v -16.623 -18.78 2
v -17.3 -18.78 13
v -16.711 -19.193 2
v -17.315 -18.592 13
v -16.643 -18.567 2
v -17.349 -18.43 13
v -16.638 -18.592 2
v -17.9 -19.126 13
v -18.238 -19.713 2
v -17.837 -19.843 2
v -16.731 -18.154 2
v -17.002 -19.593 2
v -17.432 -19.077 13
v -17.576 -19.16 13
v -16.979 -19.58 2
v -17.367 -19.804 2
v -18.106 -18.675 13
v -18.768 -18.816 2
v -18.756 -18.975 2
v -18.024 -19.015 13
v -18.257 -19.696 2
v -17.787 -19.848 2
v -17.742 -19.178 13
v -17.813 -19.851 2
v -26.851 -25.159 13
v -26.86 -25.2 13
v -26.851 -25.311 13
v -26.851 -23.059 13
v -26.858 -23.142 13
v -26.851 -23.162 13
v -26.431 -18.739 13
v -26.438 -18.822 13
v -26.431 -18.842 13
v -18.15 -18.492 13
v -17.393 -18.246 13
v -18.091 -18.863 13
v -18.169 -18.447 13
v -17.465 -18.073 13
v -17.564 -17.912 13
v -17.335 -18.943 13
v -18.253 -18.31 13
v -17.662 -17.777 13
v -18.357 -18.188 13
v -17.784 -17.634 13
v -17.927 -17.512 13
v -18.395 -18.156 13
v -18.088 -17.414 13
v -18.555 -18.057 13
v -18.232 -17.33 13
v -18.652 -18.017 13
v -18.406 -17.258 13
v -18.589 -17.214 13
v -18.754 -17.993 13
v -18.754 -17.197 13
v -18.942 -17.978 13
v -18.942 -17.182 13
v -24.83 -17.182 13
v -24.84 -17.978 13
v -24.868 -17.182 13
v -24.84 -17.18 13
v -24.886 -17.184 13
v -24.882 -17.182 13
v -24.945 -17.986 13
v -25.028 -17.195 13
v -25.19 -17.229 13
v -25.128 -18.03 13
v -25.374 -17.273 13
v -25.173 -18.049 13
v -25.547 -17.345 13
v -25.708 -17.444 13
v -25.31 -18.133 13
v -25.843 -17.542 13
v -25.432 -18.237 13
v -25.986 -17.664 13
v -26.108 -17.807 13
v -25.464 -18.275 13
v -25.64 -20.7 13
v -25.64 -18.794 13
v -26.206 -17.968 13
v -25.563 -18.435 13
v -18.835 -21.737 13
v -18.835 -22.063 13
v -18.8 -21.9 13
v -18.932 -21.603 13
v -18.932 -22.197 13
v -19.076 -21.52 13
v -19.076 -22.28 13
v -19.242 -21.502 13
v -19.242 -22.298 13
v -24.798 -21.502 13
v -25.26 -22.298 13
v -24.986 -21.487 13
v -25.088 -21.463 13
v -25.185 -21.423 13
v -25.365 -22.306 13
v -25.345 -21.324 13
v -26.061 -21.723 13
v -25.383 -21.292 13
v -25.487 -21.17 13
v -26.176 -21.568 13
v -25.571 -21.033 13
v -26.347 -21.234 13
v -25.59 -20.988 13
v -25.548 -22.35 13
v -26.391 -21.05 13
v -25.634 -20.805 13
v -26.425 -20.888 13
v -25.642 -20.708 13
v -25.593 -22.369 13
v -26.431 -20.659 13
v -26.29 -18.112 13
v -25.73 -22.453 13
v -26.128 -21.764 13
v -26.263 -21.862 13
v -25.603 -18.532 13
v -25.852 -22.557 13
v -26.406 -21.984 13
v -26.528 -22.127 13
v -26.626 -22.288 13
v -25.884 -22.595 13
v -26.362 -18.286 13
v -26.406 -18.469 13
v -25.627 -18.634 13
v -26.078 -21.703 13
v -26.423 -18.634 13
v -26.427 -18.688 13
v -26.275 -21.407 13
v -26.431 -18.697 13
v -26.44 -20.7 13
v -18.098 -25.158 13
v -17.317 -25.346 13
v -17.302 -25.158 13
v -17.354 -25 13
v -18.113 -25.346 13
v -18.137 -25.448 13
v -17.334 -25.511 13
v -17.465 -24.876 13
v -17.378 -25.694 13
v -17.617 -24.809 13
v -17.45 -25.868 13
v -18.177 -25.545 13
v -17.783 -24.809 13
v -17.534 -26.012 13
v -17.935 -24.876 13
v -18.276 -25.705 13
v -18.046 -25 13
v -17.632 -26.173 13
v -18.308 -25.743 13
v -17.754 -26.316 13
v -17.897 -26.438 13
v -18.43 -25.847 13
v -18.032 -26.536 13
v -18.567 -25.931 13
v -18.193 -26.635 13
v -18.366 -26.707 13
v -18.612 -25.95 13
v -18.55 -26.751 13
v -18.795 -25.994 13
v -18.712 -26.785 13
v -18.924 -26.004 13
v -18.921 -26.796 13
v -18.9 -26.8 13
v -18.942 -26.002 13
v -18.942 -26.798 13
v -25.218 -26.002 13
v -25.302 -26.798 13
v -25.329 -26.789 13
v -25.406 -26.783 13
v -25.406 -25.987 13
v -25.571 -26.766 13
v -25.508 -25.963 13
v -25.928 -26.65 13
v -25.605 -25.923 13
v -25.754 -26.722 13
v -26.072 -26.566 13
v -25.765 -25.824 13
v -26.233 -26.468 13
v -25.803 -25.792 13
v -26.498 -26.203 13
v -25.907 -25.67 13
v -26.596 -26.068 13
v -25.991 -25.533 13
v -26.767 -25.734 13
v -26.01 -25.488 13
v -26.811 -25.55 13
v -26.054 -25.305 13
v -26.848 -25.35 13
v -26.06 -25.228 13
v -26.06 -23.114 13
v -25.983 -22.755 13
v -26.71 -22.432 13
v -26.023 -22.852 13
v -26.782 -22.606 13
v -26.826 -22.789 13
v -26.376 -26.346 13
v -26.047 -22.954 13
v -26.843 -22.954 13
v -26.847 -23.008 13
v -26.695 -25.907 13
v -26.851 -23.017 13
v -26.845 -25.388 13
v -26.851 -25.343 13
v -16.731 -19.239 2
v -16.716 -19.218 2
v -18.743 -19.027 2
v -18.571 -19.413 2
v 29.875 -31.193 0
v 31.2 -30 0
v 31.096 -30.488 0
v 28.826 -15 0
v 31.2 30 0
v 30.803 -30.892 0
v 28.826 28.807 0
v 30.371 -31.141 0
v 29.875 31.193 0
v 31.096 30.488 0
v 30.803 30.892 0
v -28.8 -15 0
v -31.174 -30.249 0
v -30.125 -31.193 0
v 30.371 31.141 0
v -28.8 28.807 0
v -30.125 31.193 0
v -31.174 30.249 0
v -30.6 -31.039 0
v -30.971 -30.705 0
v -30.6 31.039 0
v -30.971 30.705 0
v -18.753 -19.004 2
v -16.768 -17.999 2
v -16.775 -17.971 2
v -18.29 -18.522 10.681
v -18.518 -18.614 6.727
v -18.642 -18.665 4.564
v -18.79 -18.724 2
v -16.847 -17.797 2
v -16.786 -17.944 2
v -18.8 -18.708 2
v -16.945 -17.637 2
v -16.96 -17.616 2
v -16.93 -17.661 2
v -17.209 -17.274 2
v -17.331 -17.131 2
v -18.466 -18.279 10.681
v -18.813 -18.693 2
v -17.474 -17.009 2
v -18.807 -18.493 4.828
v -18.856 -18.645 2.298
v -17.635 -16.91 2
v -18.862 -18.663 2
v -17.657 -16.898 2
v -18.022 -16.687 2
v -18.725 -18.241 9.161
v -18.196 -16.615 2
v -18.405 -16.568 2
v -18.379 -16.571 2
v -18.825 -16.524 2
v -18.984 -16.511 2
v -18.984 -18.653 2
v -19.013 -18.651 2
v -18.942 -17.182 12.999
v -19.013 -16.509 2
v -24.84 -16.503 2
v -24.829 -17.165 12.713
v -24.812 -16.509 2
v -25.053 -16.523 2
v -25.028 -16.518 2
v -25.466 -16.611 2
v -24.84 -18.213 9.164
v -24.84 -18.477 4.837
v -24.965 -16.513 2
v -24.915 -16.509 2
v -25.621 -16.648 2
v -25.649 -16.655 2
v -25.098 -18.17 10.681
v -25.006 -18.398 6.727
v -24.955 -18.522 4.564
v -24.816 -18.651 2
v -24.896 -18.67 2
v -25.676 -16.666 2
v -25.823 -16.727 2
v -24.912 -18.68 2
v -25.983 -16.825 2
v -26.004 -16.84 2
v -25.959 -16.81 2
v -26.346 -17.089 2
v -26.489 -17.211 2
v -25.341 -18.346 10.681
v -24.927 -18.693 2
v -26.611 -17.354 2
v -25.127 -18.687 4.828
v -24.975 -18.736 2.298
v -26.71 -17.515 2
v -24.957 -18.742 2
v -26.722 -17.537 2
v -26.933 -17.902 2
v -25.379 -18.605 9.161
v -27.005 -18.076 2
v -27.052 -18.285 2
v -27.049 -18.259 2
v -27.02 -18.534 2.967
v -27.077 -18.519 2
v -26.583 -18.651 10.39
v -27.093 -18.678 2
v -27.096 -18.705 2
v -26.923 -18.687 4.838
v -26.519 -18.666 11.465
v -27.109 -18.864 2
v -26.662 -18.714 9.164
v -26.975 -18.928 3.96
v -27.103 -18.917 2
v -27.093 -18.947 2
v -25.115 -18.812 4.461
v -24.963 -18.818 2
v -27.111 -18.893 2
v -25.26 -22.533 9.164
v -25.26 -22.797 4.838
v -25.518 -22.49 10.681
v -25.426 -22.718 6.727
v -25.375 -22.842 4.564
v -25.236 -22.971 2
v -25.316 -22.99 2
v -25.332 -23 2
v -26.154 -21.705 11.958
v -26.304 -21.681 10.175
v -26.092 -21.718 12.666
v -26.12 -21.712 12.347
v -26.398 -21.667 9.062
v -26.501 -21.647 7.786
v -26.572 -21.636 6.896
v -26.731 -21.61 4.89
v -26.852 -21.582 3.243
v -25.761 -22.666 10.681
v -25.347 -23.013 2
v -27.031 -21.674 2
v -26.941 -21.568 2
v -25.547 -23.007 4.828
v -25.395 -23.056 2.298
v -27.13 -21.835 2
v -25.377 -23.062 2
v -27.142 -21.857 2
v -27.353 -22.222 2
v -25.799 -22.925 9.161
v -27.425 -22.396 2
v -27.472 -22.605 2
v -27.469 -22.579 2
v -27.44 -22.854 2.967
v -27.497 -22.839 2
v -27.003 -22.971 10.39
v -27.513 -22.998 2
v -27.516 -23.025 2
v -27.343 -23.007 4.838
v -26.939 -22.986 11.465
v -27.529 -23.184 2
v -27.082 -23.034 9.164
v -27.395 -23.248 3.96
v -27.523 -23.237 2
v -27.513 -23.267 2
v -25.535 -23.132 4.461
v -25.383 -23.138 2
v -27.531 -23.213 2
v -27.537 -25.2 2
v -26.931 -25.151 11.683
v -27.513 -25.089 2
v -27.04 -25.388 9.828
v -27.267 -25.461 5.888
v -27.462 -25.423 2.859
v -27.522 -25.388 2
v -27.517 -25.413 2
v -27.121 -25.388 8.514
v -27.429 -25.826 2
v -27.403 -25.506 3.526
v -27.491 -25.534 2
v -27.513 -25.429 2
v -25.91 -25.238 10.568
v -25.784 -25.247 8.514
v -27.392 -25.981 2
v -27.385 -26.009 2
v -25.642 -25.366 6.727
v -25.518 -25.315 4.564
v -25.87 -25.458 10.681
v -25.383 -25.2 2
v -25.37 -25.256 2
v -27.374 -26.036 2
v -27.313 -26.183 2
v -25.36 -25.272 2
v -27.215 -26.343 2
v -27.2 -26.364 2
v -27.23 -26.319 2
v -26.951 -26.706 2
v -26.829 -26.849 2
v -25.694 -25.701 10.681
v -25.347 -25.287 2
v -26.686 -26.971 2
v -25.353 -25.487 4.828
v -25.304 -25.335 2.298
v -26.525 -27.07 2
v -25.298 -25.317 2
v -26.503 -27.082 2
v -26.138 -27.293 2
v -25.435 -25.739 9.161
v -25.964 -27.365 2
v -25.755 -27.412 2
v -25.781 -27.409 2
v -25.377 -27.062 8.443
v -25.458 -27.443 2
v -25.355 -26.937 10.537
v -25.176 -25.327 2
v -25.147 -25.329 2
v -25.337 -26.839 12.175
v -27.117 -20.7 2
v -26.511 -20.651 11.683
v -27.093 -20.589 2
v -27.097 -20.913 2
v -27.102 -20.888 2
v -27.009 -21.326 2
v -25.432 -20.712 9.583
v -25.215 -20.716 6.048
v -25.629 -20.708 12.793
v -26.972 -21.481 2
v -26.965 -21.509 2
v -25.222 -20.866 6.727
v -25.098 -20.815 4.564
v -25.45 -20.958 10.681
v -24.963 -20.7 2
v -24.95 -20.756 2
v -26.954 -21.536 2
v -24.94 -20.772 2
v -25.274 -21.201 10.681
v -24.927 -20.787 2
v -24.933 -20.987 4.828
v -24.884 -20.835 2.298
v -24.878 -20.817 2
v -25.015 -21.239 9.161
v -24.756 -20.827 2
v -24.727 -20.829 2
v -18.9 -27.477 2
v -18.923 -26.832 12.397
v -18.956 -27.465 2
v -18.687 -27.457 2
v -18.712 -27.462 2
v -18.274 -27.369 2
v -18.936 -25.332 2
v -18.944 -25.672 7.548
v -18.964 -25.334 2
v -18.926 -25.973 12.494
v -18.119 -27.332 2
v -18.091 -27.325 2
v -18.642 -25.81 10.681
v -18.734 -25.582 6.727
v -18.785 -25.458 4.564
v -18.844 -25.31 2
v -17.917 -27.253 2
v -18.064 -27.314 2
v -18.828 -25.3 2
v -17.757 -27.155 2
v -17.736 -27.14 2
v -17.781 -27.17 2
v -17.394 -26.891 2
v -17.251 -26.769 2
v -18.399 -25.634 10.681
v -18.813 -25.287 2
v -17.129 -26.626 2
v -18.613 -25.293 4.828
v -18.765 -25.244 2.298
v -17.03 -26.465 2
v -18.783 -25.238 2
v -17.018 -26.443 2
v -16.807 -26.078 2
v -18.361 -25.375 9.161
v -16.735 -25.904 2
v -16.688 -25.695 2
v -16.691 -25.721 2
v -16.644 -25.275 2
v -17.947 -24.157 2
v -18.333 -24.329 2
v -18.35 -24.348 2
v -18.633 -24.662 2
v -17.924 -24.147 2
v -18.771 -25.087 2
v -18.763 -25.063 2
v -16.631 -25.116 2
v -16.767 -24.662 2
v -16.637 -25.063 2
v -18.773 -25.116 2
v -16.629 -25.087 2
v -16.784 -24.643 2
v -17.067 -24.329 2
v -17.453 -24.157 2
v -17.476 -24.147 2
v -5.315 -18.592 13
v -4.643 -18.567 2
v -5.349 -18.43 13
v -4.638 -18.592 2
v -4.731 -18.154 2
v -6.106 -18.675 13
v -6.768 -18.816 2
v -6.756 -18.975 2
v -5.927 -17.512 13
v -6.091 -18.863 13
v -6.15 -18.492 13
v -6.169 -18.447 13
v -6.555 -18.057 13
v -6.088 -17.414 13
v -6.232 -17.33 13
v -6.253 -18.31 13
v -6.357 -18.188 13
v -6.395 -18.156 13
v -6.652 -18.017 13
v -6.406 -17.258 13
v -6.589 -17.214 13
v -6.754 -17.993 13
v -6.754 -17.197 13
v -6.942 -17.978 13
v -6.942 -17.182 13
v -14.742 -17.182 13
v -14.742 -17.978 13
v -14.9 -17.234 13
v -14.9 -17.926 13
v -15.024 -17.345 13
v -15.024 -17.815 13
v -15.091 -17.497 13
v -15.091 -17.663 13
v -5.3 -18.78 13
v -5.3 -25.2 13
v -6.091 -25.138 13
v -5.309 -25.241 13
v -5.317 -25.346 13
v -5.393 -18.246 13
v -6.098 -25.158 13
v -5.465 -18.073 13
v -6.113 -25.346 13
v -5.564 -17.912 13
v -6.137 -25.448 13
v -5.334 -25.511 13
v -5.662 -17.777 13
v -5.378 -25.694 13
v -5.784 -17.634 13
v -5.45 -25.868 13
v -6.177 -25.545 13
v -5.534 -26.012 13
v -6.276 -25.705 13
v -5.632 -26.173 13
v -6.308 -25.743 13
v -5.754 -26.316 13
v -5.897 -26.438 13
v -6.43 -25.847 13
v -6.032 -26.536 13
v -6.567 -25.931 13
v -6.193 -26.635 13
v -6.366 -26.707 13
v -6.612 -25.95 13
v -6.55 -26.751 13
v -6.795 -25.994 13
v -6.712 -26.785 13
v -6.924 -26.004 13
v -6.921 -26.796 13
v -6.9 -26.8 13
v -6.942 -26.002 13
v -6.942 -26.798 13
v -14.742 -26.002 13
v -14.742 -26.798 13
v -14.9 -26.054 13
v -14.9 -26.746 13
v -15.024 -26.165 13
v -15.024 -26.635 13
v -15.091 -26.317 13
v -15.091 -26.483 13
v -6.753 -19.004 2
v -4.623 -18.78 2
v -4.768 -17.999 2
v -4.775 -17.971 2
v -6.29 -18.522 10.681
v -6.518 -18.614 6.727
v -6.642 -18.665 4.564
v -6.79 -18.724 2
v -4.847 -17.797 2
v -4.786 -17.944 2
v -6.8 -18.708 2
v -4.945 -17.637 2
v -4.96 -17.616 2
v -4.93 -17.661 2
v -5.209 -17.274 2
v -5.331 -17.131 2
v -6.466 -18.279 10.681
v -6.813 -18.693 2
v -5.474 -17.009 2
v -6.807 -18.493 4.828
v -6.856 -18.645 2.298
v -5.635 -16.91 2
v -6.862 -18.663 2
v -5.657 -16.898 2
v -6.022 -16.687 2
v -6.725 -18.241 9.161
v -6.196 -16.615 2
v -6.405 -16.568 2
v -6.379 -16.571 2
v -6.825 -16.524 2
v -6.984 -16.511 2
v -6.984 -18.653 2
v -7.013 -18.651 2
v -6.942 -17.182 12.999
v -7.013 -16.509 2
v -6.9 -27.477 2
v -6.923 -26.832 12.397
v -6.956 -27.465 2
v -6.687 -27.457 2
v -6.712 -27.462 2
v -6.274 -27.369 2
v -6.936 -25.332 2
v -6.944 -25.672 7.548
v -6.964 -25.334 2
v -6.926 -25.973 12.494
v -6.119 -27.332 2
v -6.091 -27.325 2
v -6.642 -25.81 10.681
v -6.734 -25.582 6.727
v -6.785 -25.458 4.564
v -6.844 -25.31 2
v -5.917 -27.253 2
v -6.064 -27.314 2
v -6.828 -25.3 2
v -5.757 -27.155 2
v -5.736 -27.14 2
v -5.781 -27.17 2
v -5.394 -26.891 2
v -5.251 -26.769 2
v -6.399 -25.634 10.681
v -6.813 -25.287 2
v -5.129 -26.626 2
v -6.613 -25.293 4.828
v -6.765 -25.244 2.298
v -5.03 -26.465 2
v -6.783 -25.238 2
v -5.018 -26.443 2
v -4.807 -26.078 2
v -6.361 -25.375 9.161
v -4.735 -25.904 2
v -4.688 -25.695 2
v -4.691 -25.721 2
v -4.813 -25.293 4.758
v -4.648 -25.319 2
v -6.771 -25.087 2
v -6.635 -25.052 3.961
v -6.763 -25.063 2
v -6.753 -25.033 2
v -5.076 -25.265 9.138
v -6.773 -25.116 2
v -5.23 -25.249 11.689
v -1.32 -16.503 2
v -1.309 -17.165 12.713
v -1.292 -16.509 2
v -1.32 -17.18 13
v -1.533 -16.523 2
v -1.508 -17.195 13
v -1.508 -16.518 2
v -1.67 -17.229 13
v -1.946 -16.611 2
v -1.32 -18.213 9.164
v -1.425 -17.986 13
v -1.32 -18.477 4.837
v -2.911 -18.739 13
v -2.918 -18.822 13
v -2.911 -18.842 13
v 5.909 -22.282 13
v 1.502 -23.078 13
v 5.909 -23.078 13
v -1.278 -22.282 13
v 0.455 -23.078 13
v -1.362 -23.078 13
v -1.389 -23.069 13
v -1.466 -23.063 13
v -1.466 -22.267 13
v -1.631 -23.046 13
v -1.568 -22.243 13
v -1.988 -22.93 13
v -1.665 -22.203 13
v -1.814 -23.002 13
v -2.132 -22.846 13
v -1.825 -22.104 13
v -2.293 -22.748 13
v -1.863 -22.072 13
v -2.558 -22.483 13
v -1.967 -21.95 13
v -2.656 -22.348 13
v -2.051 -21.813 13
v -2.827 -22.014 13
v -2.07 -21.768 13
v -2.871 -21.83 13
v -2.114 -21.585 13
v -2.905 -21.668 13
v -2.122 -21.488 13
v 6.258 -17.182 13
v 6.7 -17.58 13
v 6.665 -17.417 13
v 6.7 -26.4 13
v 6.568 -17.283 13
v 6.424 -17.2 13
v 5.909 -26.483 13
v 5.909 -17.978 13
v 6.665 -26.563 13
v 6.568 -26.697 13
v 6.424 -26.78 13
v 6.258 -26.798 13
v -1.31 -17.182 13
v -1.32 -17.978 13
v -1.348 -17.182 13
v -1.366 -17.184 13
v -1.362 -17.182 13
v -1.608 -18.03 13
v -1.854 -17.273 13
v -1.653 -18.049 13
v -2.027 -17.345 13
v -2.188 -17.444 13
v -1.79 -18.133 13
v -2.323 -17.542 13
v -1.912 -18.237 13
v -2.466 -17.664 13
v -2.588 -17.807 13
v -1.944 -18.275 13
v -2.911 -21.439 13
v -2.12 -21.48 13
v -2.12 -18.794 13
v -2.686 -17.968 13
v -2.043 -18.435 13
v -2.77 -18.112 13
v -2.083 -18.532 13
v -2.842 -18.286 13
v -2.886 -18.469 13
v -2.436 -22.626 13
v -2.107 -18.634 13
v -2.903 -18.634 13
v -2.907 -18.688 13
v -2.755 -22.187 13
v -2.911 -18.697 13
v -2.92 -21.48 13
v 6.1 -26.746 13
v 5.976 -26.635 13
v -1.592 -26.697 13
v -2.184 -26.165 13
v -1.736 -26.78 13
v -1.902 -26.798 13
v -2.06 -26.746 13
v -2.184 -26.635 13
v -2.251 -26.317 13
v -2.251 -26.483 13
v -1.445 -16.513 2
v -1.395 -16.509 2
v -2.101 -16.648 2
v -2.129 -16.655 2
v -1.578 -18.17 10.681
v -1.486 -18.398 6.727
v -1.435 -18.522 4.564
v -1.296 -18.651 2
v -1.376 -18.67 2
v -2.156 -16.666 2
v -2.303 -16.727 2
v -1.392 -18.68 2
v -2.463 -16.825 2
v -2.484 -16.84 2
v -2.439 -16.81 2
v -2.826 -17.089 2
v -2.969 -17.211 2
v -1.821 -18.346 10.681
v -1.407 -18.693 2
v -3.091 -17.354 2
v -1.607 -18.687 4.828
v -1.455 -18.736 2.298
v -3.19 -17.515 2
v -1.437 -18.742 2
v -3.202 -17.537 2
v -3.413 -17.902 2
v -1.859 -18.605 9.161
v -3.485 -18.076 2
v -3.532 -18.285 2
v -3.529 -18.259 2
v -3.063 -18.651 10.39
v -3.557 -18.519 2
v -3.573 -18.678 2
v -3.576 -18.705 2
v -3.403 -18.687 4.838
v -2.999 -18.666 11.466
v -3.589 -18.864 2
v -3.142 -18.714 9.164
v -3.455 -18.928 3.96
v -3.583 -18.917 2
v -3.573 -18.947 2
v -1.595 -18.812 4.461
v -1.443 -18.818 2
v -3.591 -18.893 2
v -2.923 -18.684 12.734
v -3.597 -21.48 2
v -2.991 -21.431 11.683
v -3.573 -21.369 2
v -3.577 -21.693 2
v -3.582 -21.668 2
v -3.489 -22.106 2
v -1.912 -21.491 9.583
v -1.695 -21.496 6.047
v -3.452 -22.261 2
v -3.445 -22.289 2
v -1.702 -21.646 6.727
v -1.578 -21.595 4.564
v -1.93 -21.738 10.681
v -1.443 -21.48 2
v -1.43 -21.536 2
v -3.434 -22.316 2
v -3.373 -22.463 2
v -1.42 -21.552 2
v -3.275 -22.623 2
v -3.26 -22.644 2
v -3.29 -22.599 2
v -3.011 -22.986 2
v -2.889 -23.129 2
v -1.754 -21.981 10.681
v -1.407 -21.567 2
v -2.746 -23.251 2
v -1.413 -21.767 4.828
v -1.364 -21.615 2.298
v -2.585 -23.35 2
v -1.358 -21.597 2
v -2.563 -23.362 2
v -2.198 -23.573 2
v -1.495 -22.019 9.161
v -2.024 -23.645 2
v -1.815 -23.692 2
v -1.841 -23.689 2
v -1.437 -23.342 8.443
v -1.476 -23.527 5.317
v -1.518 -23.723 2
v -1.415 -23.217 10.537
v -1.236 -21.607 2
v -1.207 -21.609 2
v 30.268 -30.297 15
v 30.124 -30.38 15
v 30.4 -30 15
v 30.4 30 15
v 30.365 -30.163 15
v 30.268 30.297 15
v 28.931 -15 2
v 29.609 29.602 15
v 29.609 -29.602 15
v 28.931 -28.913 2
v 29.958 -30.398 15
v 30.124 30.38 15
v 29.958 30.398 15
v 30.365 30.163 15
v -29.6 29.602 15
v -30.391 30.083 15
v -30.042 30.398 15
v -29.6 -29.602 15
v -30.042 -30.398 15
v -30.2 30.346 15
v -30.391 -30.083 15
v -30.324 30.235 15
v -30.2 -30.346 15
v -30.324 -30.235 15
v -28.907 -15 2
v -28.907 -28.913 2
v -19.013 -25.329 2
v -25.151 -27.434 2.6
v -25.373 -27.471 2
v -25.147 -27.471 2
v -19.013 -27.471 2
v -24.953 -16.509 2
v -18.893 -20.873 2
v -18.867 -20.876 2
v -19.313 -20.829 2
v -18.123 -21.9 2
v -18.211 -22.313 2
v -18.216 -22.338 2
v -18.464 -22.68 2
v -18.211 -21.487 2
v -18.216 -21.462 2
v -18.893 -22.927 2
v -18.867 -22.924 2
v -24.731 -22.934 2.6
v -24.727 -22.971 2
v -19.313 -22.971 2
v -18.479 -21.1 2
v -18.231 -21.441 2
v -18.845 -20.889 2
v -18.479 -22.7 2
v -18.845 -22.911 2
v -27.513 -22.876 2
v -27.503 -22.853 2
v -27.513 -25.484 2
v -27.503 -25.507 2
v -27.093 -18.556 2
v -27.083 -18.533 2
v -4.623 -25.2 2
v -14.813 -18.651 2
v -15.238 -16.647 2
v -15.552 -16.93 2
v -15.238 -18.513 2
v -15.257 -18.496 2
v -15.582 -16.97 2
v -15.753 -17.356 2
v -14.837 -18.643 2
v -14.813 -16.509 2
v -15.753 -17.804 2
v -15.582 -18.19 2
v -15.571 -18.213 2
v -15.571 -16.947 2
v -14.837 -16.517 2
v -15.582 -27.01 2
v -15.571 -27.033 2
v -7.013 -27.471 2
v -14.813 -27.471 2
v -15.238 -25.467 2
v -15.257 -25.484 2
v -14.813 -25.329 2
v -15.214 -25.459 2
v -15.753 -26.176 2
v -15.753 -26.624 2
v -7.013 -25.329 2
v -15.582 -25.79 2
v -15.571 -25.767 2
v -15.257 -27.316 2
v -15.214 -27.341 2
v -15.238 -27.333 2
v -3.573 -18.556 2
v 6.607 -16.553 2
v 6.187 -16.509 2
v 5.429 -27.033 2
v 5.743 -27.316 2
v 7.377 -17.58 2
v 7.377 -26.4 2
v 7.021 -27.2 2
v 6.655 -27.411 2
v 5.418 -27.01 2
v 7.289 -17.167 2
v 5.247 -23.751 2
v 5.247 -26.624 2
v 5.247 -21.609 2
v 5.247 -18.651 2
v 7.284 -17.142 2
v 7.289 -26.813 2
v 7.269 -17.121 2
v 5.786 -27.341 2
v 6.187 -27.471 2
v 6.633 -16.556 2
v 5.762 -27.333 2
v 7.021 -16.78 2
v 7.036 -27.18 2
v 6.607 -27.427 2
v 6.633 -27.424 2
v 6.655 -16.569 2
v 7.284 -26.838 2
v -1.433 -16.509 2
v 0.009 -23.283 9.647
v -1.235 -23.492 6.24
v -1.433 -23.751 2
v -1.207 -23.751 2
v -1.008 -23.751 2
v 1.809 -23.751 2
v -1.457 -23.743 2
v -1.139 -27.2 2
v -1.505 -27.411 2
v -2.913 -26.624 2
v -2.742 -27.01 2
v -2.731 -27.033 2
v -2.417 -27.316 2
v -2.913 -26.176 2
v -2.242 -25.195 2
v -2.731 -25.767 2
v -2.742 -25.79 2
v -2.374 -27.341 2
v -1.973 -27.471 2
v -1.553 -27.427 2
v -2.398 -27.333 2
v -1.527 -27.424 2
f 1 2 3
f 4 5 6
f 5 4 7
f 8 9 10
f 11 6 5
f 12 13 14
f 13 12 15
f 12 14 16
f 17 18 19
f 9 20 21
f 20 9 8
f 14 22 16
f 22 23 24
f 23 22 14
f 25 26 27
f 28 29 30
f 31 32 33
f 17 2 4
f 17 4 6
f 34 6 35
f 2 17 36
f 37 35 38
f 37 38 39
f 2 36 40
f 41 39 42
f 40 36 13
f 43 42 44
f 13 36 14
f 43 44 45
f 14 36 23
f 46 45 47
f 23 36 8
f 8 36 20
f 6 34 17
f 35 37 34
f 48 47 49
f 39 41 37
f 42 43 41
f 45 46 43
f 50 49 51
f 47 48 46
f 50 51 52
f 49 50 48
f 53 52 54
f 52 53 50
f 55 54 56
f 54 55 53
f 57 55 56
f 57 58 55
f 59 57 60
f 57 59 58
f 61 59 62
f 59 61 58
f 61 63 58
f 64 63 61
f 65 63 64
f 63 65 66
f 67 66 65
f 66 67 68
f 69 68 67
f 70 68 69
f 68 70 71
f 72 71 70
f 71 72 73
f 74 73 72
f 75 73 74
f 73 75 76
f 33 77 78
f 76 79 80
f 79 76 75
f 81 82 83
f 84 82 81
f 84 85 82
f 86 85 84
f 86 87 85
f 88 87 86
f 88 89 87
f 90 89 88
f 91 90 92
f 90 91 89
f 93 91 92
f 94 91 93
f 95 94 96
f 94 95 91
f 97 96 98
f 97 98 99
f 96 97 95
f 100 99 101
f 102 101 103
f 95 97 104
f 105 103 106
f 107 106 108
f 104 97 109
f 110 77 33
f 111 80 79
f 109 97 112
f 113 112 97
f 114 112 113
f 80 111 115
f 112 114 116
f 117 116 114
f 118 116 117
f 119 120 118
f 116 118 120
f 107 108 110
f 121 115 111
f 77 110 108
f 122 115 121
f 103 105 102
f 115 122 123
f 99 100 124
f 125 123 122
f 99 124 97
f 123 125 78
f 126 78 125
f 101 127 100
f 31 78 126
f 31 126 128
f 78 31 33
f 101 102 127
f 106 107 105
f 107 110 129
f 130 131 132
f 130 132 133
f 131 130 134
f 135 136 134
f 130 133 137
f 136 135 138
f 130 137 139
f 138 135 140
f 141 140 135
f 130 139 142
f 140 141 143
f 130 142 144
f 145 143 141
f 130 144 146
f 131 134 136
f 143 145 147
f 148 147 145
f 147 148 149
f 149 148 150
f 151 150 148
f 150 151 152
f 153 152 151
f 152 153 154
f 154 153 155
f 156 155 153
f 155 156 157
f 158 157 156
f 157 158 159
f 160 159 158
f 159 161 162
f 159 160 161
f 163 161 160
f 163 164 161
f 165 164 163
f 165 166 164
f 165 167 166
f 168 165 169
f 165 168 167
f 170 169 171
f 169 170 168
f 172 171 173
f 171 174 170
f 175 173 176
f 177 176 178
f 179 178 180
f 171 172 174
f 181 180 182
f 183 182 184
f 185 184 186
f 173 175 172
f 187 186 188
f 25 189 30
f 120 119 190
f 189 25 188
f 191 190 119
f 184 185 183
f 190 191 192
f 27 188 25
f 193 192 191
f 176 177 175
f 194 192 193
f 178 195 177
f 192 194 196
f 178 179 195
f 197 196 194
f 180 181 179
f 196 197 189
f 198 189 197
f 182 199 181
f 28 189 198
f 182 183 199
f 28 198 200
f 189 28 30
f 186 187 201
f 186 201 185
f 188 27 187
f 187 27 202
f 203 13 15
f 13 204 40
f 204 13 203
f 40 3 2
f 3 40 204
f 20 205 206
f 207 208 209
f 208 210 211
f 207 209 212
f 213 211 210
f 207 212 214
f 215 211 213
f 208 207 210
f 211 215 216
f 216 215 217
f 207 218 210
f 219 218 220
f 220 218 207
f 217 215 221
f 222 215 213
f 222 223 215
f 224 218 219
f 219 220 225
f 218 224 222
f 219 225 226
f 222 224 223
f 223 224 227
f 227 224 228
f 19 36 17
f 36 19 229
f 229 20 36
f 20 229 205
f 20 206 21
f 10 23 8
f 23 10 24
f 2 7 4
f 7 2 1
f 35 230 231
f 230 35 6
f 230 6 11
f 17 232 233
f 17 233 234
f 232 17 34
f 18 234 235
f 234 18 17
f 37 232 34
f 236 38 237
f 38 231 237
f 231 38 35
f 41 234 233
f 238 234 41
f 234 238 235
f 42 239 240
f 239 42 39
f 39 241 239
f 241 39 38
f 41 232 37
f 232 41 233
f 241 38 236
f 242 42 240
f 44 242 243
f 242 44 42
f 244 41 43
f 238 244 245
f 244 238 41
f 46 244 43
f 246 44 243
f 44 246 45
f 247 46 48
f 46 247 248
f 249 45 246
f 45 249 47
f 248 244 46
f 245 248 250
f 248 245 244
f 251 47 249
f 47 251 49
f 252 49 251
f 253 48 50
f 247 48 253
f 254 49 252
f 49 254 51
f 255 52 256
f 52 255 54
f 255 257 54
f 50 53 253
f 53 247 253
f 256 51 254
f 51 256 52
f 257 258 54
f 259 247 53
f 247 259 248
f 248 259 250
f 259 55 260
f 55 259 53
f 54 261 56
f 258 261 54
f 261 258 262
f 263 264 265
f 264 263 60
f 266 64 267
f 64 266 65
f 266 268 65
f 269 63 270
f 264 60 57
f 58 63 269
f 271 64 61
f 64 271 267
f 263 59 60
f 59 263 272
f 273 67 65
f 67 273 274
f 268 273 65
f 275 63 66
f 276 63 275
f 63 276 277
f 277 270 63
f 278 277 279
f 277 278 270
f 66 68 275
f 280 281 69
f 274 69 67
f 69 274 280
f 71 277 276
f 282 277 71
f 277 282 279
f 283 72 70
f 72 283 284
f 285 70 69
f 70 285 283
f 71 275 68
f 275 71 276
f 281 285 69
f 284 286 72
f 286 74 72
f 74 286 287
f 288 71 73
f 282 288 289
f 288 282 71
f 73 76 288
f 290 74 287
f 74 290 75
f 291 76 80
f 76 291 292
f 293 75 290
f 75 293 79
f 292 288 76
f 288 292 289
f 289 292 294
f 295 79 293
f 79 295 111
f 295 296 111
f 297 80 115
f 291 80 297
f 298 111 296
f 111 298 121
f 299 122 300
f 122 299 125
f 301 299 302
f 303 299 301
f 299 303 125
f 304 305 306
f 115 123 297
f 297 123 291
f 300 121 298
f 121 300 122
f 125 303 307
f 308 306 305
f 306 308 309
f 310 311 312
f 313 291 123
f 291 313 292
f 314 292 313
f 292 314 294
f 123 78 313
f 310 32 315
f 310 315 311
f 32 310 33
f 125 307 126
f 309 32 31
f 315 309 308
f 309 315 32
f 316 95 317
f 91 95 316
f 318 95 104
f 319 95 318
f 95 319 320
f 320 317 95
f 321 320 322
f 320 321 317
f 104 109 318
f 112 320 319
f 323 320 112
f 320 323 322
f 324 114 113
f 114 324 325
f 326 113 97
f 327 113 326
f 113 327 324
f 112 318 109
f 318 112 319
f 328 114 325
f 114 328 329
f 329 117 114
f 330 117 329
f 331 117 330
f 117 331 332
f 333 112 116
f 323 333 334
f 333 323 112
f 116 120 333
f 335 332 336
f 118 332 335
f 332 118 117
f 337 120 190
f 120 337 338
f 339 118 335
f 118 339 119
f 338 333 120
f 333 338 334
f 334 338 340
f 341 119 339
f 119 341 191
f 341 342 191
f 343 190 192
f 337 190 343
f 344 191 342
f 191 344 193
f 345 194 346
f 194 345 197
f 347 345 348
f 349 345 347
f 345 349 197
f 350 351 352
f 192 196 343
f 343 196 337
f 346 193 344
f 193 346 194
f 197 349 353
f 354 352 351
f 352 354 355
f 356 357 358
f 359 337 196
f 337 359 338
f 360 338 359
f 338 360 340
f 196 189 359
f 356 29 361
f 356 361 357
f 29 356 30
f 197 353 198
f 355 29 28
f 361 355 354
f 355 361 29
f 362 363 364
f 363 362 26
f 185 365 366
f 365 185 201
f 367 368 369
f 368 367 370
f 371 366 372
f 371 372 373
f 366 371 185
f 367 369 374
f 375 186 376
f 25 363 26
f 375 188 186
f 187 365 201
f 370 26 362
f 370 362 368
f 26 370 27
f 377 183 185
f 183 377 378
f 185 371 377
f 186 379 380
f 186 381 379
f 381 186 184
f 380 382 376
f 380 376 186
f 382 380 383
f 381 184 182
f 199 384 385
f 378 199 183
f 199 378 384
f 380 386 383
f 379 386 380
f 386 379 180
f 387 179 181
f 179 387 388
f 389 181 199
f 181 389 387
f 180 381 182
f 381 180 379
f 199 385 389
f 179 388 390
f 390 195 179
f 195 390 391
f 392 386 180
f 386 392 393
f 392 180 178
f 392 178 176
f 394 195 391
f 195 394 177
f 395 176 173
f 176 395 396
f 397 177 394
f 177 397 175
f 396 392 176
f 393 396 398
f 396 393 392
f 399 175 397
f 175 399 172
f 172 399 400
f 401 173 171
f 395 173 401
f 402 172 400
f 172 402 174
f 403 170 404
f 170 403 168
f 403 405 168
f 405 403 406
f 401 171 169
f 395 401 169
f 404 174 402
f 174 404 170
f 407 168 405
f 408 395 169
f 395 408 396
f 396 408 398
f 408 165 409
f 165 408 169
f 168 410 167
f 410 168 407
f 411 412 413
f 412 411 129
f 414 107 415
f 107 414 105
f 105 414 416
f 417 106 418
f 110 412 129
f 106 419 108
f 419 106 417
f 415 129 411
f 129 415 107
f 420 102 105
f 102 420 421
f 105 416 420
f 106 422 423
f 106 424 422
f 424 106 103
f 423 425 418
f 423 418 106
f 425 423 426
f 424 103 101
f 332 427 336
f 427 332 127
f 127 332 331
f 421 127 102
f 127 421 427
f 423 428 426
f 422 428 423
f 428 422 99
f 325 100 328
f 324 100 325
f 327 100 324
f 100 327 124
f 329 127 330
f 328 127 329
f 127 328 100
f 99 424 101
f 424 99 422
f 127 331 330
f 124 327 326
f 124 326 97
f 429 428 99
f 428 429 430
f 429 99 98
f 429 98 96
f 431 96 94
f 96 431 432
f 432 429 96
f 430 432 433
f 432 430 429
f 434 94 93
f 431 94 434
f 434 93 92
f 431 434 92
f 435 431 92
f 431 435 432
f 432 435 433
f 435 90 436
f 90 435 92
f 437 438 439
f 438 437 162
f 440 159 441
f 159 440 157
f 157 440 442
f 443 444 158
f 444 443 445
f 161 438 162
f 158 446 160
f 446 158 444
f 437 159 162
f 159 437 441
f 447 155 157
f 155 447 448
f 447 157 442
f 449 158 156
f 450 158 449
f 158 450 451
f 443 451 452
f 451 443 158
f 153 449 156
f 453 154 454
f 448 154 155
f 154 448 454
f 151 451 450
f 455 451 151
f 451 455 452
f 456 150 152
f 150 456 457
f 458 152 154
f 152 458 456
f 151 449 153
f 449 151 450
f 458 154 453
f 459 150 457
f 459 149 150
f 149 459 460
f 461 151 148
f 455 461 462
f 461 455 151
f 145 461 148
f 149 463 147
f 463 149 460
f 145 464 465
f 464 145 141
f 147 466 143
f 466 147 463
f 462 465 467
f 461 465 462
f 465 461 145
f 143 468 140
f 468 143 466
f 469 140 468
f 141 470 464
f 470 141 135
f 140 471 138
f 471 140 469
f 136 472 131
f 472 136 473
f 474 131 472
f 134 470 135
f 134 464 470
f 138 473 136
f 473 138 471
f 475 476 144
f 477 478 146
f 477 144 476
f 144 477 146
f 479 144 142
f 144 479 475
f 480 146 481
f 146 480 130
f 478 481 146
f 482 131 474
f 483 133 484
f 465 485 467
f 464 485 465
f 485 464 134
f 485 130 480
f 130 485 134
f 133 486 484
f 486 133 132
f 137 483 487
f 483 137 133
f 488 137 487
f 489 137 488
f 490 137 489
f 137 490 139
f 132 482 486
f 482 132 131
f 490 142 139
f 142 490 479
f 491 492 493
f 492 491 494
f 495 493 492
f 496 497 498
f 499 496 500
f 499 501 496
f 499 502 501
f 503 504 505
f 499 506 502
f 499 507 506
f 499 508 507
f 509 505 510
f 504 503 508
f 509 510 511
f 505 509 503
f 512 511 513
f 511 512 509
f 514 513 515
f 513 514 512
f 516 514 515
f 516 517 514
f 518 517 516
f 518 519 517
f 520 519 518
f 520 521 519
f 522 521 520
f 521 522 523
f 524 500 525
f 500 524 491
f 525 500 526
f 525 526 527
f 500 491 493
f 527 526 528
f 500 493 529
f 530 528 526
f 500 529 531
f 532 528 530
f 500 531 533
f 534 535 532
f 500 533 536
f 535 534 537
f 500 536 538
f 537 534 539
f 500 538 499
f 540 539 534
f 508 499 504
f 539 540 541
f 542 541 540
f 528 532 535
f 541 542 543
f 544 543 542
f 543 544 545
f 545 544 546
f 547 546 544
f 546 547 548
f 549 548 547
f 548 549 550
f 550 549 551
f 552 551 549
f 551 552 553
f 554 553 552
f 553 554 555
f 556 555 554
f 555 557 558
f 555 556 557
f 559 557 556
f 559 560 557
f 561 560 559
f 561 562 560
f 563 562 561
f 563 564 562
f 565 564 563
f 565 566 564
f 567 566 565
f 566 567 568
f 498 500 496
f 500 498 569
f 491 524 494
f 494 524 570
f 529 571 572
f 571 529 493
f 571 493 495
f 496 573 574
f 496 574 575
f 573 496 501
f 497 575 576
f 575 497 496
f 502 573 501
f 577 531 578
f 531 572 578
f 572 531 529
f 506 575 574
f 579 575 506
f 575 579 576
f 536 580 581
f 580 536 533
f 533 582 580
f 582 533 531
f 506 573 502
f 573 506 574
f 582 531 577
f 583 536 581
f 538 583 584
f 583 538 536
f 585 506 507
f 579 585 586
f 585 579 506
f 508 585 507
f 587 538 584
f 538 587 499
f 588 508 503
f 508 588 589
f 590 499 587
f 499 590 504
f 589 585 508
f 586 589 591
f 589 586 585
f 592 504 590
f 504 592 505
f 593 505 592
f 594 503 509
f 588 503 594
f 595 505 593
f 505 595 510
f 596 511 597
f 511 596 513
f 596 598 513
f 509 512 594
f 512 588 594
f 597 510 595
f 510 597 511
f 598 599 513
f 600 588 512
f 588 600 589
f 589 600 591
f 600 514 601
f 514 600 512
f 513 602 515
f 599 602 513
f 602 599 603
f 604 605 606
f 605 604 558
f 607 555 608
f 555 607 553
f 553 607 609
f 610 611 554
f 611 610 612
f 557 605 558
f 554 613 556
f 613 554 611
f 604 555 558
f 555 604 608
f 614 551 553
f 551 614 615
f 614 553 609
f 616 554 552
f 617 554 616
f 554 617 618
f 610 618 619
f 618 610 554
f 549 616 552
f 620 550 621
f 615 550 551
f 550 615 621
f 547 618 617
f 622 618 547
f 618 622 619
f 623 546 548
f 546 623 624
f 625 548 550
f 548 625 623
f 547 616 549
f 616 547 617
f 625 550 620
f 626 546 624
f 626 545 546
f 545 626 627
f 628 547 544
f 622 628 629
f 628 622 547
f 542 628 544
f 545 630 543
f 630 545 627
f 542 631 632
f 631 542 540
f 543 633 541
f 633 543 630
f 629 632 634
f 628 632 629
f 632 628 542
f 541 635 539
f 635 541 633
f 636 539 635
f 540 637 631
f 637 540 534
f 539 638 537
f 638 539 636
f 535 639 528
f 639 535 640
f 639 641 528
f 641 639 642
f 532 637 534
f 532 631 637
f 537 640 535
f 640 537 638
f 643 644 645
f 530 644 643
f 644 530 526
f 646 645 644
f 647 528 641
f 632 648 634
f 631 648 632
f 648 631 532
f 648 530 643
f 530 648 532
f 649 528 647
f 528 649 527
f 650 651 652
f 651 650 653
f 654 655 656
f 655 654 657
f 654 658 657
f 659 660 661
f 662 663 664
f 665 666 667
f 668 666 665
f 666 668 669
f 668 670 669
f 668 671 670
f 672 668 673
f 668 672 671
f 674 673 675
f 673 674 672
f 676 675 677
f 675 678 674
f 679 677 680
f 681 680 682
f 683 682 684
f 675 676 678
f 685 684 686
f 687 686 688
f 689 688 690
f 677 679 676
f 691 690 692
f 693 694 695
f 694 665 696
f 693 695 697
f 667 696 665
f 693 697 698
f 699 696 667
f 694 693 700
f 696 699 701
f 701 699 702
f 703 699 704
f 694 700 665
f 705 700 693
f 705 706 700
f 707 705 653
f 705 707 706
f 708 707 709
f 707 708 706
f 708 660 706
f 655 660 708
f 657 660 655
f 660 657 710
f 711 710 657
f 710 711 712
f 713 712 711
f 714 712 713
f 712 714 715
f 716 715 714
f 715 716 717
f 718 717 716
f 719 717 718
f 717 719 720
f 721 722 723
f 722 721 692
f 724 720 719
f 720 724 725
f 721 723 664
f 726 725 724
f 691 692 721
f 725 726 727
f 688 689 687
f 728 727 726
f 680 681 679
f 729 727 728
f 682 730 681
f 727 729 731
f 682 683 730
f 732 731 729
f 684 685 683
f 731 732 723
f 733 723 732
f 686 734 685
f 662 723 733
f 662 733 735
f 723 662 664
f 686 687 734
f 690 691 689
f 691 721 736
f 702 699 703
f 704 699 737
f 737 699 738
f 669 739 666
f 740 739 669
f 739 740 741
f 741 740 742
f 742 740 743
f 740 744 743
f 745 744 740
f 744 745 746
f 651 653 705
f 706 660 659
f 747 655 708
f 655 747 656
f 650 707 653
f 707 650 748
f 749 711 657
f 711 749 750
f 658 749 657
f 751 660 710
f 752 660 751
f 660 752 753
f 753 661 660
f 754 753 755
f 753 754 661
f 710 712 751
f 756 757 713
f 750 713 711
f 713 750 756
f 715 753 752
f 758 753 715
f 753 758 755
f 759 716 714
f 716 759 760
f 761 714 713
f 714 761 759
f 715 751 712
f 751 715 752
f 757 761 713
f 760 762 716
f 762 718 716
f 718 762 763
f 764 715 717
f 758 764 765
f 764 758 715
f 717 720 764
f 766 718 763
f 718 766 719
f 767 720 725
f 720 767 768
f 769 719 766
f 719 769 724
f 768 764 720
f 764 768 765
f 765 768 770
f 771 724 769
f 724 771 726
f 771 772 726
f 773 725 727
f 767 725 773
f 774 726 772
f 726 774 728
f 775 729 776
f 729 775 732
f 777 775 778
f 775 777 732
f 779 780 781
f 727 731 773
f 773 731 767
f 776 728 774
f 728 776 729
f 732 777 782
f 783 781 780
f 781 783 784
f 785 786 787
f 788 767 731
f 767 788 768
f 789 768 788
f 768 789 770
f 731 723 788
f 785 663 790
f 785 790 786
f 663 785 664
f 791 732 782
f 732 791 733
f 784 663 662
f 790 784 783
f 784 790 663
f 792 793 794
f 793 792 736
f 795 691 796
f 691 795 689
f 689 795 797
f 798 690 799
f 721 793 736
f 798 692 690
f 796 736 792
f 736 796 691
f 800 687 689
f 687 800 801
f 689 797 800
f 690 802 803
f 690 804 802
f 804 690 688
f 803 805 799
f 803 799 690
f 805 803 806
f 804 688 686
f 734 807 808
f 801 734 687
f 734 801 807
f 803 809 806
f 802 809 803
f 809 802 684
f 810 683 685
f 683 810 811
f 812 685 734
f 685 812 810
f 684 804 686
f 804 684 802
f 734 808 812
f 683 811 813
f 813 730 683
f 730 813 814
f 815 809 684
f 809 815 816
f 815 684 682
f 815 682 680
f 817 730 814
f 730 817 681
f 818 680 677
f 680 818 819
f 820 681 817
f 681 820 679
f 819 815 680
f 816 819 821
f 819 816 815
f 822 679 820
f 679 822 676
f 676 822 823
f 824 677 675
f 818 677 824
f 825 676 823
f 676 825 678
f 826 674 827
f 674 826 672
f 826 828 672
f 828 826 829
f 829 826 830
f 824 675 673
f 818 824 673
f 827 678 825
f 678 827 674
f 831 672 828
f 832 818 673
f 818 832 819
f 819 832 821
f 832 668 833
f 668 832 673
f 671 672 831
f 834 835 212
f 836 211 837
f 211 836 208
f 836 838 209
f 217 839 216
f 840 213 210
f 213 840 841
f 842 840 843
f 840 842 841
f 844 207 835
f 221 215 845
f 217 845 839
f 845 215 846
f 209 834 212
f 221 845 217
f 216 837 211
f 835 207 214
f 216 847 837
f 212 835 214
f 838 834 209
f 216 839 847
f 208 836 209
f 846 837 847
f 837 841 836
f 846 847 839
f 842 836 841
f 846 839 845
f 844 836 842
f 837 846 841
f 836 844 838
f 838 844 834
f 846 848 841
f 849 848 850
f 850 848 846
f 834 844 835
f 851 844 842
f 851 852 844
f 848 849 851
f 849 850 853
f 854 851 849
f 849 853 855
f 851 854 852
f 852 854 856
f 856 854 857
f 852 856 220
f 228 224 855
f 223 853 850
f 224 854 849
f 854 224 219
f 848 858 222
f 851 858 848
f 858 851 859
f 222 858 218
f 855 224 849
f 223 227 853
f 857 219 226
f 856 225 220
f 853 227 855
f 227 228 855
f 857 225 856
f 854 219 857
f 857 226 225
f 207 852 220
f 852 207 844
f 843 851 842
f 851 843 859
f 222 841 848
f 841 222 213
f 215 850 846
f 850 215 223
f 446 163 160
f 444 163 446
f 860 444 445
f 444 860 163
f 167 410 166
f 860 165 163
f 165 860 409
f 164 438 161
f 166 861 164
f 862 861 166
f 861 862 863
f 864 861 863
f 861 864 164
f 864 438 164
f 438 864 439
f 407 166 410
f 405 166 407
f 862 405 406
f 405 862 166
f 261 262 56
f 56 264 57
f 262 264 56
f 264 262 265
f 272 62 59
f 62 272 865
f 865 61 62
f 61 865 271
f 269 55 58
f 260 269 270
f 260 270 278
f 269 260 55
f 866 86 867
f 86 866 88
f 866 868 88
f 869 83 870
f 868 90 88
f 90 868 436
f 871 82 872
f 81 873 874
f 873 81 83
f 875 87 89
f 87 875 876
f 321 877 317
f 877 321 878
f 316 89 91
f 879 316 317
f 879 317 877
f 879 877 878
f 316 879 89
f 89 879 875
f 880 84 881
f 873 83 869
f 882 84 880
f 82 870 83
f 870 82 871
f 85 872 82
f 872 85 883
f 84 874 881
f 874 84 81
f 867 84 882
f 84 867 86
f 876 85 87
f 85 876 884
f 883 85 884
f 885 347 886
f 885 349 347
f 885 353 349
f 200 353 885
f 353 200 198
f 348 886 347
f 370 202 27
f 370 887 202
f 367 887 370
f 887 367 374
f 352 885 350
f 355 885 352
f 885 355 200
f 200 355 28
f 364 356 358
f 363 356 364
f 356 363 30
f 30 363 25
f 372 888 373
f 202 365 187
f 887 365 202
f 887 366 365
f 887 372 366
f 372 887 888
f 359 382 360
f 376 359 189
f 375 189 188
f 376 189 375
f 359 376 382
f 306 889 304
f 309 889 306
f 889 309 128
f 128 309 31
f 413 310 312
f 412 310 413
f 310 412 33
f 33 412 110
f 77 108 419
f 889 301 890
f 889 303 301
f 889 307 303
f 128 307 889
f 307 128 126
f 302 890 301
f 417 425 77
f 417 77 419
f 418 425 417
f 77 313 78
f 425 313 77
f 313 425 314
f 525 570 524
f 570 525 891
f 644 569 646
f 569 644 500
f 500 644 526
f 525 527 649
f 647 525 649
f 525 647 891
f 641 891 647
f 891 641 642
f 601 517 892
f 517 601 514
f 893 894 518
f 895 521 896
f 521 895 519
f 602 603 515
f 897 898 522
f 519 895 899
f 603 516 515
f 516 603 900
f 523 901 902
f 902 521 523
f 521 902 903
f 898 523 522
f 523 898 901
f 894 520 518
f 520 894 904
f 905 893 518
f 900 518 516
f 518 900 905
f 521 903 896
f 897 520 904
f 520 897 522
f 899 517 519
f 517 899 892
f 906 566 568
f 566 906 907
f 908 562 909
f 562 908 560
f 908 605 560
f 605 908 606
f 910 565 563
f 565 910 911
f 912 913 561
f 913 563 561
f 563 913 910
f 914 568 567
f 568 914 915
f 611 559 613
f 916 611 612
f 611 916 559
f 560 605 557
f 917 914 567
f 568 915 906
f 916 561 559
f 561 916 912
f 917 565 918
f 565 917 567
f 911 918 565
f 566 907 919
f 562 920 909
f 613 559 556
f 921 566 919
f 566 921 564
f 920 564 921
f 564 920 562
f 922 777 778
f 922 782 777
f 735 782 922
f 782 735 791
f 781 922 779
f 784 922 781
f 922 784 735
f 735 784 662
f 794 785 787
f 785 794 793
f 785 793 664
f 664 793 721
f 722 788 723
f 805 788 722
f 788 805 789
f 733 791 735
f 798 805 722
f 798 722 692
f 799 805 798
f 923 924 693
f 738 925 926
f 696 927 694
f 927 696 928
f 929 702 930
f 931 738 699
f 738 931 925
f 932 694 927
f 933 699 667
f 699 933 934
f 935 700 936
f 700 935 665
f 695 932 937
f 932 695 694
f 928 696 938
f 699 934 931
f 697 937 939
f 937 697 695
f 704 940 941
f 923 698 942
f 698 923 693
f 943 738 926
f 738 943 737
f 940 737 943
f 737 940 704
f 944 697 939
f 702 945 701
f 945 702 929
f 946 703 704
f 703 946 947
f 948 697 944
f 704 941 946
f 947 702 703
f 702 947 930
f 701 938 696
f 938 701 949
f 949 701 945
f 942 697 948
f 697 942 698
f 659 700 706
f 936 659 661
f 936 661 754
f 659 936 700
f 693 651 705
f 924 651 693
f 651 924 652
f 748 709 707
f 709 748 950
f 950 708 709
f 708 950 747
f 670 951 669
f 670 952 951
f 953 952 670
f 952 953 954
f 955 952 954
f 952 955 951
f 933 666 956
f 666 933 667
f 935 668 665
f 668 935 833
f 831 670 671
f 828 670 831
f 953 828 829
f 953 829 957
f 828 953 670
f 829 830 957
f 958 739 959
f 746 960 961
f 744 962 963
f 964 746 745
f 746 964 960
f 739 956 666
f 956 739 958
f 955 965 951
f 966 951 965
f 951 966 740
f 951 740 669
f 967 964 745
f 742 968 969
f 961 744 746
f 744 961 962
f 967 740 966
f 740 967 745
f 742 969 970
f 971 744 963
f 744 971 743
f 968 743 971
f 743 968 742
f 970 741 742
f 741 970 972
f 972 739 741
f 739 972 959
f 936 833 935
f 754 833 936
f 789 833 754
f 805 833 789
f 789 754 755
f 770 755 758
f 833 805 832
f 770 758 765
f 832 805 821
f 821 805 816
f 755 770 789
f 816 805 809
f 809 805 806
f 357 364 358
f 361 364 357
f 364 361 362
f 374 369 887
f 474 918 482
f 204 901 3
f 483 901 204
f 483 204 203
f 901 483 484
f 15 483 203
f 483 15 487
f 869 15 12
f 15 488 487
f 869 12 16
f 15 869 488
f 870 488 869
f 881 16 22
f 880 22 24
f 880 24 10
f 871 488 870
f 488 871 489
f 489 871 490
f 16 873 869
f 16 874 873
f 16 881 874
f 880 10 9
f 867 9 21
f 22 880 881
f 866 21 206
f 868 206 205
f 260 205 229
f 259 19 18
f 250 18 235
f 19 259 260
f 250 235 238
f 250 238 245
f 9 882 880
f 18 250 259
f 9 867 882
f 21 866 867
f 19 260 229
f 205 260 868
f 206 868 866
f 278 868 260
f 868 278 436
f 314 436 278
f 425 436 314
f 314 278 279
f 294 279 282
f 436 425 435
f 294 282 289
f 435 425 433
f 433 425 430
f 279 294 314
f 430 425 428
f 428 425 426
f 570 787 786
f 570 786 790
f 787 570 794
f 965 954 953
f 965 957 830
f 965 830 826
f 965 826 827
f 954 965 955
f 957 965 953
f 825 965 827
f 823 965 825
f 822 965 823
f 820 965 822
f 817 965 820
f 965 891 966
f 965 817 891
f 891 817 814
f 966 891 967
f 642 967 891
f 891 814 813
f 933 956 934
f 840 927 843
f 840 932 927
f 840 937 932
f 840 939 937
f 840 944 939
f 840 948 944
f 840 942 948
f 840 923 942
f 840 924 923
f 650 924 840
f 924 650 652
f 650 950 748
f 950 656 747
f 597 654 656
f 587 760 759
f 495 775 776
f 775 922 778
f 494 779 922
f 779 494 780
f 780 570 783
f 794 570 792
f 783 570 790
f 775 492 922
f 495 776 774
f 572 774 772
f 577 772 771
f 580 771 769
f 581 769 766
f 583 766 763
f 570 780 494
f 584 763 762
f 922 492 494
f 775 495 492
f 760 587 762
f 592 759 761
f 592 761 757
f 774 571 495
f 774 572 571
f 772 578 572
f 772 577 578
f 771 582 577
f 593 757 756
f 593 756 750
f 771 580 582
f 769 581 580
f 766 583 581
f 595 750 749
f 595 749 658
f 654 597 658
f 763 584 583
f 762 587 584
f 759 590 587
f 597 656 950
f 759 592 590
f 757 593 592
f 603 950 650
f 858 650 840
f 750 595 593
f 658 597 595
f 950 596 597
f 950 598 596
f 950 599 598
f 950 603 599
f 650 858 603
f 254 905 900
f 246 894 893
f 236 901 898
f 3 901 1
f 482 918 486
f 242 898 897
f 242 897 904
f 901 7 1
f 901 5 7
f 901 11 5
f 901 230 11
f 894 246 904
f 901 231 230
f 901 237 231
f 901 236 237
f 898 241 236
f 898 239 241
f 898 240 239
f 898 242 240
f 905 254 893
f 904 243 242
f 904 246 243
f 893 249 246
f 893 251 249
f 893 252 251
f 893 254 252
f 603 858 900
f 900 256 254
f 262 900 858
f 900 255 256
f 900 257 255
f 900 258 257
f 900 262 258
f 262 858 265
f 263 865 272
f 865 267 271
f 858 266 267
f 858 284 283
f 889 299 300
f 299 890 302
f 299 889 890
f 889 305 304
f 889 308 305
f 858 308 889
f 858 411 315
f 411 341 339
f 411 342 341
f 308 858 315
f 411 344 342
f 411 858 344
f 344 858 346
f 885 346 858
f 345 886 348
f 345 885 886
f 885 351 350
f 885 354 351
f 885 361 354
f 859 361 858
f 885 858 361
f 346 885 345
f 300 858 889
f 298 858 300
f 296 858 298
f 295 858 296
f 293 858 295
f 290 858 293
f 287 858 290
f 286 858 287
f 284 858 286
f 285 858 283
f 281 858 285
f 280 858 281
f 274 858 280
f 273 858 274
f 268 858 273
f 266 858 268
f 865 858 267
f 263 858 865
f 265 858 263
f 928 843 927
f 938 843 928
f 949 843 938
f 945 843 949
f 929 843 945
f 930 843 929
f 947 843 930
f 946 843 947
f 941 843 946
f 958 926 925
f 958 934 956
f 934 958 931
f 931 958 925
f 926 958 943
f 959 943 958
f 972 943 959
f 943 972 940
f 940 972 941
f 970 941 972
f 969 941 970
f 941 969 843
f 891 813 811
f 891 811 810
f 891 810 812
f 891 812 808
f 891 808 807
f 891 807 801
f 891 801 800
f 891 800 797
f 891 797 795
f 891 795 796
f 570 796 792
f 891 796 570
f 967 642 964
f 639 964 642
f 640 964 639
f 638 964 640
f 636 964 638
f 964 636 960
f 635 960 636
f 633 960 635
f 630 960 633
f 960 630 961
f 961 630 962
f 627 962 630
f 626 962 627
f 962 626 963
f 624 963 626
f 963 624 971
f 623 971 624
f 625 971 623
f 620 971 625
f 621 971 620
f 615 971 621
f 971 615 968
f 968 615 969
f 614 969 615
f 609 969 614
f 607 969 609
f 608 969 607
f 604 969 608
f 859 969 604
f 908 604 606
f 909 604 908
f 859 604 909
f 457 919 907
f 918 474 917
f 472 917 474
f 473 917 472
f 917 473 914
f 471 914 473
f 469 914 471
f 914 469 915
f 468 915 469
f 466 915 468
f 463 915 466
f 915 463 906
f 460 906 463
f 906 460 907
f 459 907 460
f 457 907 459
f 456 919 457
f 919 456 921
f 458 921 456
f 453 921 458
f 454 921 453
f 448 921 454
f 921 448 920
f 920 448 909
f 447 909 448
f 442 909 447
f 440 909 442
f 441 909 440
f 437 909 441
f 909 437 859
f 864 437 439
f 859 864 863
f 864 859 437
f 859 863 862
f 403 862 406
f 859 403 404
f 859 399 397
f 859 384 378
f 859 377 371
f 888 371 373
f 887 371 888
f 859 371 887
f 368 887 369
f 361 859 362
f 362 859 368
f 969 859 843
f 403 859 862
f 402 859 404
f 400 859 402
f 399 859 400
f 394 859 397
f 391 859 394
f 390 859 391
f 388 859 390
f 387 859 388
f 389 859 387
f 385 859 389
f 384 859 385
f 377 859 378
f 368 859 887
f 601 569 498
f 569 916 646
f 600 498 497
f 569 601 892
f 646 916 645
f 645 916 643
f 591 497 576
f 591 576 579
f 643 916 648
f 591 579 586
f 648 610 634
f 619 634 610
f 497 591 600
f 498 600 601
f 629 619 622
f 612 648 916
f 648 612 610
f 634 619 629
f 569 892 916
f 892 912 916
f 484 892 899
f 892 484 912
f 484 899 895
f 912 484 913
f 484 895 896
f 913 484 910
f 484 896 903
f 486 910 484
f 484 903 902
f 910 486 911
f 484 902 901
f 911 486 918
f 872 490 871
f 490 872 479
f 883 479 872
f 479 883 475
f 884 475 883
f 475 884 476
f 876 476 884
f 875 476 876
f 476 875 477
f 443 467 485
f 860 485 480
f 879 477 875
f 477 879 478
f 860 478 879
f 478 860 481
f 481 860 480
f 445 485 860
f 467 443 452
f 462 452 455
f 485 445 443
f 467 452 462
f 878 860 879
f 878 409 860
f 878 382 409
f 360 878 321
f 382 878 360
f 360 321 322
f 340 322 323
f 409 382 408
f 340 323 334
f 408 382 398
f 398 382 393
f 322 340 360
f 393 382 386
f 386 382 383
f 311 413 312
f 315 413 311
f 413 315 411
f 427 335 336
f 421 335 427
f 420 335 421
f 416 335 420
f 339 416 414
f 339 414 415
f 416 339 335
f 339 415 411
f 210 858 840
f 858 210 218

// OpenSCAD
// variables, all in mm
fs = 1;  // roughly the size of straight parts of curves
w1 = 2.4;   // cookie cutter, thicker side
w2 = 0.8;   // cookie cutter, thinner side
h = 15;     // cookie cutter height
dc = 2;     // dough cut
sc = 60;    // size of cookie

// model
// outside
straight_line([sc/2, sc/2], [sc/2, -sc/2]);
straight_line([-sc/2, sc/2], [-sc/2, -sc/2]);
straight_line([sc/2, -sc/2], [-sc/2, -sc/2]);
straight_line([sc/2, sc/2], [-sc/2, sc/2]);
// 3
translate([-0.315*sc, -0.313*sc])corner2();
translate([-0.414*sc, -0.313*sc])rotate([0, 0, 90])corner2();
translate([-0.421*sc, -0.385*sc])rotate([0, 0, 90])corner2();
translate([-0.421*sc, -0.42*sc])rotate([0, 0, 180])corner2();
translate([-0.414*sc, -0.345*sc])rotate([0, 0, 180])corner2();
translate([-0.315*sc, -0.42*sc])rotate([0, 0, 270])corner2();
straight_line2([-0.315*sc, -0.44*sc], [-0.421*sc, -0.44*sc]);
straight_line2([-0.315*sc, -0.293*sc], [-0.414*sc, -0.293*sc]);
straight_line2([-0.32*sc, -0.365*sc], [-0.421*sc, -0.365*sc]);
straight_line2([-0.441*sc, -0.385*sc], [-0.441*sc, -0.421*sc]);
straight_line2([-0.434*sc, -0.313*sc], [-0.434*sc, -0.345*sc]);
// C
translate([-0.115*sc, -0.313*sc])corner2();
translate([-0.115*sc, -0.42*sc])rotate([0, 0, 270])corner2();
straight_line2([-0.095*sc, -0.313*sc], [-0.095*sc, -0.42*sc]);
straight_line2([-0.245*sc, -0.293*sc], [-0.115*sc, -0.293*sc]);
straight_line2([-0.245*sc, -0.44*sc], [-0.115*sc, -0.44*sc]);
// R
translate([-0.022*sc, -0.313*sc])rotate([0, 0, 90])corner2();
translate([-0.022*sc, -0.358*sc])rotate([0, 0, 180])corner2();
straight_line2([-0.042*sc, -0.313*sc], [-0.042*sc, -0.358*sc]);
straight_line2([0.105*sc, -0.293*sc], [0.105*sc, -0.44*sc]);
straight_line2([0.105*sc, -0.293*sc], [-0.022*sc, -0.293*sc]);
straight_line2([0.105*sc, -0.378*sc], [-0.022*sc, -0.378*sc]);
straight_line2([0.022*sc, -0.378*sc], [-0.031*sc, -0.44*sc]);
// letter support
translate([-sc/2, -sc/2, 0])cube([sc, sc/4, 2]);

// functions and modules
module shape() cylinder(h, w1/2, w2/2, $fn=15);
module shape2() cylinder(h-dc, w1/2, w2/2, $fn=15);

module corner2() circle_ish2(0.02*sc, 90, 10);

module straight_line(a, b)  // a and b are points/vectors
    hull(){ 
       translate(a) shape();
       translate(b) shape();
    }
module straight_line2(a, b)  // a and b are points/vectors
    hull(){ 
       translate(a) shape2();
       translate(b) shape2();
    }
    
module circle_ish2(r, angle, fn)   
    let (interval = angle/fn)
    for (i= [0:interval:(angle-interval)]) 
        hull(){
            translate([cos(i)*r, sin(i)*r, 0]) shape2(); 
            translate([cos(i+interval)*r, sin(i+interval)*r, 0]) shape2(); 
        }
    
